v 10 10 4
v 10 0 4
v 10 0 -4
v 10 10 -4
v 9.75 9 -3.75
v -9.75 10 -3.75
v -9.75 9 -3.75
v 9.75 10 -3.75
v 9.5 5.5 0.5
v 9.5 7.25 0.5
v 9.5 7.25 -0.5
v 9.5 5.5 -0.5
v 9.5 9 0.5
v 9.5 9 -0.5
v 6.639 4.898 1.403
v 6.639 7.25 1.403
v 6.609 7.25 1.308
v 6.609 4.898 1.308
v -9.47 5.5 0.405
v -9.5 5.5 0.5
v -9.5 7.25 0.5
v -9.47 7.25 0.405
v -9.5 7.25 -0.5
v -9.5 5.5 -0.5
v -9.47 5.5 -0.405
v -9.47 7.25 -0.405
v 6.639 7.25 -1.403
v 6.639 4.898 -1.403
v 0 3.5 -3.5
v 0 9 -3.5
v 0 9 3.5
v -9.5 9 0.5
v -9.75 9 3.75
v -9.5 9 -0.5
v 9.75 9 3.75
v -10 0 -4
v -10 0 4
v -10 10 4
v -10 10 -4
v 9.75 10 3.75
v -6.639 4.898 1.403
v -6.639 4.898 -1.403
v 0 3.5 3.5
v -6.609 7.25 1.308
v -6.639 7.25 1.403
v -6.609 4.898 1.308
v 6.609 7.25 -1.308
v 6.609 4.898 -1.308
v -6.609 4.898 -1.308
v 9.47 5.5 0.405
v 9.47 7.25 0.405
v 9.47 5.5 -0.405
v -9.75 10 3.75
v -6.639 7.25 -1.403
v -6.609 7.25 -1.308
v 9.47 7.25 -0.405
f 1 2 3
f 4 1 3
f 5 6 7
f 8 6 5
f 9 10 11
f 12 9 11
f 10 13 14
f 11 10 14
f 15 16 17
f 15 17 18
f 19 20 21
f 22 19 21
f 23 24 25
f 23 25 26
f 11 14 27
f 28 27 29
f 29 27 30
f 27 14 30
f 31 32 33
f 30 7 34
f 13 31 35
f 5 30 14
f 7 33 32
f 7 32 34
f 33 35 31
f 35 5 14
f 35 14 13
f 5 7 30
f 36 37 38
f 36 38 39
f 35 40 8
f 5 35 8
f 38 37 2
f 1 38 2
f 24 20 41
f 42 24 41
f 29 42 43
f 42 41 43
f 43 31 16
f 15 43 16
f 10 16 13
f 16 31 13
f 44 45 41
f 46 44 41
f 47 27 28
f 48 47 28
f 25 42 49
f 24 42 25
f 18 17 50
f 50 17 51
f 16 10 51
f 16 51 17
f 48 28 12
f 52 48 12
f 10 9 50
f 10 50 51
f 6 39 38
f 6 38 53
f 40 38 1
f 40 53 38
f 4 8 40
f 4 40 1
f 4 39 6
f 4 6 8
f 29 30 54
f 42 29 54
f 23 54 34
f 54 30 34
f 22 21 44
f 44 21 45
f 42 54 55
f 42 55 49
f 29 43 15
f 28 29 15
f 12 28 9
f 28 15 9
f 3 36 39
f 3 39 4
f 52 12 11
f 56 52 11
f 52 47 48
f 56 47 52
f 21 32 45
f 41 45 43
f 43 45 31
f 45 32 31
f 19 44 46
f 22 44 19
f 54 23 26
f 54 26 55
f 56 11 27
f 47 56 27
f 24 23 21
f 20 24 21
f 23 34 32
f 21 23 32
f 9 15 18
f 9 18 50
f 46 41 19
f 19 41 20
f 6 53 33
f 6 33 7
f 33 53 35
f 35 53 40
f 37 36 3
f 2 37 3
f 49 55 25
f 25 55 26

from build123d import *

# Parameters (mm, degrees)
SKETCH_1_W                      = 20
SKETCH_1_H                      = 8
EXTRUDE_1_DEPTH                 = 10
CUT_EXTRUDE_2_DEPTH             = 3
CUT_EXTRUDE_3_REACH             = 16.697
CUT_EXTRUDE_3_DIRECTION_2_REACH = 16.697
CUT_EXTRUDE_START               = 3.5
CUT_EXTRUDE_4_DEPTH             = 3.5
CUT_EXTRUDE_START_2             = -3.424924247
CUT_EXTRUDE_4_2_DEPTH           = 1.95709957
SKETCH_7_W                      = 19.5
SKETCH_7_H                      = 7.5
CUT_EXTRUDE_5_DEPTH             = 1
EXTRUDE_6_DEPTH                 = 0.1
MIRROR_2_COPY_1_DEPTH           = 0.1


with BuildPart() as part:
    # 草圖1 → 伸長1 (new body)
    with BuildSketch(Plane(origin=(0, 0, 0), x_dir=(1, 0, 0), z_dir=(0, 1, 0))):
        Rectangle(SKETCH_1_W, SKETCH_1_H)
    extrude(amount=EXTRUDE_1_DEPTH)

    # 草圖2 → 伸長2 (cut)
    with BuildSketch(Plane(origin=(0, 10, 0), x_dir=(1, 0, 0), z_dir=(0, 1, 0))):
        Polygon((-9.5, 0.5), (-9.5, -0.5), (0, -3.5), (9.5, -0.5), (9.5, 0.5), (0, 3.5), align=None)
    extrude(amount=-CUT_EXTRUDE_2_DEPTH, mode=Mode.SUBTRACT)

    # 伸長3: up to this plane
    cut_extrude_3_end = Plane(origin=(0, 7, -3.5), z_dir=(-0.3011313679370976, 0, -0.9535826651341416))
    # 草圖4 → 伸長3 (cut, up to the surface)
    with BuildSketch(Plane.XY, mode=Mode.PRIVATE) as cut_extrude_3_sk1:
        Polygon((0, 10), (-9.5, 10), (-9.5, 5.5), (0, 3.5), align=None)
    cut_extrude_3_tool1 = split(extrude(cut_extrude_3_sk1.sketch, amount=-CUT_EXTRUDE_3_REACH, mode=Mode.PRIVATE), bisect_by=cut_extrude_3_end, keep=Keep.BOTH, mode=Mode.PRIVATE)
    add(cut_extrude_3_tool1.solids().sort_by_distance((-4.462121, 7.219697, 0))[0], mode=Mode.SUBTRACT)

    # 伸長3 direction 2: up to this plane
    cut_extrude_3_direction_2_end = Plane(origin=(-9.5, 7, 0.5), z_dir=(-0.3011313679370972, 0, 0.9535826651341417))
    # 草圖4 → 伸長3 direction 2 (cut, up to the surface)
    with BuildSketch(Plane.XY, mode=Mode.PRIVATE) as cut_extrude_3_direction_2_sk1:
        Polygon((0, 10), (-9.5, 10), (-9.5, 5.5), (0, 3.5), align=None)
    cut_extrude_3_direction_2_tool1 = split(extrude(cut_extrude_3_direction_2_sk1.sketch, amount=CUT_EXTRUDE_3_DIRECTION_2_REACH, mode=Mode.PRIVATE), bisect_by=cut_extrude_3_direction_2_end, keep=Keep.BOTH, mode=Mode.PRIVATE)
    add(cut_extrude_3_direction_2_tool1.solids().sort_by_distance((-4.462121, 7.219697, 0))[0], mode=Mode.SUBTRACT)

    # 伸長4: read off the stored shape, not the designer's step
    # 伸長4 outline → 伸長4 (cut)
    with BuildSketch(Plane(origin=(0, 0, 0), x_dir=(1, 0, 0), z_dir=(0, 1, 0)).offset(CUT_EXTRUDE_START)):
        Polygon((9.5, -0.5), (9.5, 0.5), (0, 3.5), (0, -3.5), align=None)
    extrude(amount=CUT_EXTRUDE_4_DEPTH, mode=Mode.SUBTRACT)

    # Cut-Extrude 4 2 outline → Cut-Extrude 4 2 (add)
    with BuildSketch(Plane(origin=(0, 0, 0), x_dir=(0.978549784986749, 0.206010481049842, 0), z_dir=(0.206010481049842, -0.978549784986749, 0)).offset(CUT_EXTRUDE_START_2)):
        Polygon((0.721036684, 3.5), (0.721036684, -3.5), (10.429280603, -0.5), (10.429280603, 0.5), align=None)
    extrude(amount=CUT_EXTRUDE_4_2_DEPTH)

    # 草圖7 → 伸長5 (cut)
    with BuildSketch(Plane(origin=(0, 10, 0), x_dir=(1, 0, 0), z_dir=(0, 1, 0))):
        Rectangle(SKETCH_7_W, SKETCH_7_H)
    extrude(amount=-CUT_EXTRUDE_5_DEPTH, mode=Mode.SUBTRACT)

    # 草圖8 → 伸長6 (add)
    with BuildSketch(Plane(origin=(-1.005037783, 0, -3.182619647), x_dir=(0.9535826651341416, 0, -0.3011313679370976), z_dir=(0.3011313679370976, 0, 0.9535826651341416))):
        Polygon((-8.908469635, 5.5), (-8.908469635, 7.25), (-5.908469635, 7.25), (-5.908469635, 4.897737264), align=None)
    extrude_6 = extrude(amount=EXTRUDE_6_DEPTH)

    # 鏡射1: 伸長6 across plane
    add(extrude_6.mirror(Plane.XY))

    # 鏡射2: 伸長6 across plane
    add(extrude_6.mirror(Plane(origin=(0, 0, 0), x_dir=(0, 0, 1), z_dir=(1, 0, 0))))

    # 鏡射2 copy 1 sketch → 鏡射2 copy 1 (add)
    with BuildSketch(Plane(origin=(1.005037783, 0, 3.182619647), x_dir=(-0.9535826651341415, 0, 0.301131367937098), z_dir=(-0.301131367937098, 0, -0.9535826651341415))):
        Polygon((-8.908469635, 5.5), (-8.908469635, 7.25), (-5.908469635, 7.25), (-5.908469635, 4.897737264), align=None)
    extrude(amount=MIRROR_2_COPY_1_DEPTH)


solid = part.part
